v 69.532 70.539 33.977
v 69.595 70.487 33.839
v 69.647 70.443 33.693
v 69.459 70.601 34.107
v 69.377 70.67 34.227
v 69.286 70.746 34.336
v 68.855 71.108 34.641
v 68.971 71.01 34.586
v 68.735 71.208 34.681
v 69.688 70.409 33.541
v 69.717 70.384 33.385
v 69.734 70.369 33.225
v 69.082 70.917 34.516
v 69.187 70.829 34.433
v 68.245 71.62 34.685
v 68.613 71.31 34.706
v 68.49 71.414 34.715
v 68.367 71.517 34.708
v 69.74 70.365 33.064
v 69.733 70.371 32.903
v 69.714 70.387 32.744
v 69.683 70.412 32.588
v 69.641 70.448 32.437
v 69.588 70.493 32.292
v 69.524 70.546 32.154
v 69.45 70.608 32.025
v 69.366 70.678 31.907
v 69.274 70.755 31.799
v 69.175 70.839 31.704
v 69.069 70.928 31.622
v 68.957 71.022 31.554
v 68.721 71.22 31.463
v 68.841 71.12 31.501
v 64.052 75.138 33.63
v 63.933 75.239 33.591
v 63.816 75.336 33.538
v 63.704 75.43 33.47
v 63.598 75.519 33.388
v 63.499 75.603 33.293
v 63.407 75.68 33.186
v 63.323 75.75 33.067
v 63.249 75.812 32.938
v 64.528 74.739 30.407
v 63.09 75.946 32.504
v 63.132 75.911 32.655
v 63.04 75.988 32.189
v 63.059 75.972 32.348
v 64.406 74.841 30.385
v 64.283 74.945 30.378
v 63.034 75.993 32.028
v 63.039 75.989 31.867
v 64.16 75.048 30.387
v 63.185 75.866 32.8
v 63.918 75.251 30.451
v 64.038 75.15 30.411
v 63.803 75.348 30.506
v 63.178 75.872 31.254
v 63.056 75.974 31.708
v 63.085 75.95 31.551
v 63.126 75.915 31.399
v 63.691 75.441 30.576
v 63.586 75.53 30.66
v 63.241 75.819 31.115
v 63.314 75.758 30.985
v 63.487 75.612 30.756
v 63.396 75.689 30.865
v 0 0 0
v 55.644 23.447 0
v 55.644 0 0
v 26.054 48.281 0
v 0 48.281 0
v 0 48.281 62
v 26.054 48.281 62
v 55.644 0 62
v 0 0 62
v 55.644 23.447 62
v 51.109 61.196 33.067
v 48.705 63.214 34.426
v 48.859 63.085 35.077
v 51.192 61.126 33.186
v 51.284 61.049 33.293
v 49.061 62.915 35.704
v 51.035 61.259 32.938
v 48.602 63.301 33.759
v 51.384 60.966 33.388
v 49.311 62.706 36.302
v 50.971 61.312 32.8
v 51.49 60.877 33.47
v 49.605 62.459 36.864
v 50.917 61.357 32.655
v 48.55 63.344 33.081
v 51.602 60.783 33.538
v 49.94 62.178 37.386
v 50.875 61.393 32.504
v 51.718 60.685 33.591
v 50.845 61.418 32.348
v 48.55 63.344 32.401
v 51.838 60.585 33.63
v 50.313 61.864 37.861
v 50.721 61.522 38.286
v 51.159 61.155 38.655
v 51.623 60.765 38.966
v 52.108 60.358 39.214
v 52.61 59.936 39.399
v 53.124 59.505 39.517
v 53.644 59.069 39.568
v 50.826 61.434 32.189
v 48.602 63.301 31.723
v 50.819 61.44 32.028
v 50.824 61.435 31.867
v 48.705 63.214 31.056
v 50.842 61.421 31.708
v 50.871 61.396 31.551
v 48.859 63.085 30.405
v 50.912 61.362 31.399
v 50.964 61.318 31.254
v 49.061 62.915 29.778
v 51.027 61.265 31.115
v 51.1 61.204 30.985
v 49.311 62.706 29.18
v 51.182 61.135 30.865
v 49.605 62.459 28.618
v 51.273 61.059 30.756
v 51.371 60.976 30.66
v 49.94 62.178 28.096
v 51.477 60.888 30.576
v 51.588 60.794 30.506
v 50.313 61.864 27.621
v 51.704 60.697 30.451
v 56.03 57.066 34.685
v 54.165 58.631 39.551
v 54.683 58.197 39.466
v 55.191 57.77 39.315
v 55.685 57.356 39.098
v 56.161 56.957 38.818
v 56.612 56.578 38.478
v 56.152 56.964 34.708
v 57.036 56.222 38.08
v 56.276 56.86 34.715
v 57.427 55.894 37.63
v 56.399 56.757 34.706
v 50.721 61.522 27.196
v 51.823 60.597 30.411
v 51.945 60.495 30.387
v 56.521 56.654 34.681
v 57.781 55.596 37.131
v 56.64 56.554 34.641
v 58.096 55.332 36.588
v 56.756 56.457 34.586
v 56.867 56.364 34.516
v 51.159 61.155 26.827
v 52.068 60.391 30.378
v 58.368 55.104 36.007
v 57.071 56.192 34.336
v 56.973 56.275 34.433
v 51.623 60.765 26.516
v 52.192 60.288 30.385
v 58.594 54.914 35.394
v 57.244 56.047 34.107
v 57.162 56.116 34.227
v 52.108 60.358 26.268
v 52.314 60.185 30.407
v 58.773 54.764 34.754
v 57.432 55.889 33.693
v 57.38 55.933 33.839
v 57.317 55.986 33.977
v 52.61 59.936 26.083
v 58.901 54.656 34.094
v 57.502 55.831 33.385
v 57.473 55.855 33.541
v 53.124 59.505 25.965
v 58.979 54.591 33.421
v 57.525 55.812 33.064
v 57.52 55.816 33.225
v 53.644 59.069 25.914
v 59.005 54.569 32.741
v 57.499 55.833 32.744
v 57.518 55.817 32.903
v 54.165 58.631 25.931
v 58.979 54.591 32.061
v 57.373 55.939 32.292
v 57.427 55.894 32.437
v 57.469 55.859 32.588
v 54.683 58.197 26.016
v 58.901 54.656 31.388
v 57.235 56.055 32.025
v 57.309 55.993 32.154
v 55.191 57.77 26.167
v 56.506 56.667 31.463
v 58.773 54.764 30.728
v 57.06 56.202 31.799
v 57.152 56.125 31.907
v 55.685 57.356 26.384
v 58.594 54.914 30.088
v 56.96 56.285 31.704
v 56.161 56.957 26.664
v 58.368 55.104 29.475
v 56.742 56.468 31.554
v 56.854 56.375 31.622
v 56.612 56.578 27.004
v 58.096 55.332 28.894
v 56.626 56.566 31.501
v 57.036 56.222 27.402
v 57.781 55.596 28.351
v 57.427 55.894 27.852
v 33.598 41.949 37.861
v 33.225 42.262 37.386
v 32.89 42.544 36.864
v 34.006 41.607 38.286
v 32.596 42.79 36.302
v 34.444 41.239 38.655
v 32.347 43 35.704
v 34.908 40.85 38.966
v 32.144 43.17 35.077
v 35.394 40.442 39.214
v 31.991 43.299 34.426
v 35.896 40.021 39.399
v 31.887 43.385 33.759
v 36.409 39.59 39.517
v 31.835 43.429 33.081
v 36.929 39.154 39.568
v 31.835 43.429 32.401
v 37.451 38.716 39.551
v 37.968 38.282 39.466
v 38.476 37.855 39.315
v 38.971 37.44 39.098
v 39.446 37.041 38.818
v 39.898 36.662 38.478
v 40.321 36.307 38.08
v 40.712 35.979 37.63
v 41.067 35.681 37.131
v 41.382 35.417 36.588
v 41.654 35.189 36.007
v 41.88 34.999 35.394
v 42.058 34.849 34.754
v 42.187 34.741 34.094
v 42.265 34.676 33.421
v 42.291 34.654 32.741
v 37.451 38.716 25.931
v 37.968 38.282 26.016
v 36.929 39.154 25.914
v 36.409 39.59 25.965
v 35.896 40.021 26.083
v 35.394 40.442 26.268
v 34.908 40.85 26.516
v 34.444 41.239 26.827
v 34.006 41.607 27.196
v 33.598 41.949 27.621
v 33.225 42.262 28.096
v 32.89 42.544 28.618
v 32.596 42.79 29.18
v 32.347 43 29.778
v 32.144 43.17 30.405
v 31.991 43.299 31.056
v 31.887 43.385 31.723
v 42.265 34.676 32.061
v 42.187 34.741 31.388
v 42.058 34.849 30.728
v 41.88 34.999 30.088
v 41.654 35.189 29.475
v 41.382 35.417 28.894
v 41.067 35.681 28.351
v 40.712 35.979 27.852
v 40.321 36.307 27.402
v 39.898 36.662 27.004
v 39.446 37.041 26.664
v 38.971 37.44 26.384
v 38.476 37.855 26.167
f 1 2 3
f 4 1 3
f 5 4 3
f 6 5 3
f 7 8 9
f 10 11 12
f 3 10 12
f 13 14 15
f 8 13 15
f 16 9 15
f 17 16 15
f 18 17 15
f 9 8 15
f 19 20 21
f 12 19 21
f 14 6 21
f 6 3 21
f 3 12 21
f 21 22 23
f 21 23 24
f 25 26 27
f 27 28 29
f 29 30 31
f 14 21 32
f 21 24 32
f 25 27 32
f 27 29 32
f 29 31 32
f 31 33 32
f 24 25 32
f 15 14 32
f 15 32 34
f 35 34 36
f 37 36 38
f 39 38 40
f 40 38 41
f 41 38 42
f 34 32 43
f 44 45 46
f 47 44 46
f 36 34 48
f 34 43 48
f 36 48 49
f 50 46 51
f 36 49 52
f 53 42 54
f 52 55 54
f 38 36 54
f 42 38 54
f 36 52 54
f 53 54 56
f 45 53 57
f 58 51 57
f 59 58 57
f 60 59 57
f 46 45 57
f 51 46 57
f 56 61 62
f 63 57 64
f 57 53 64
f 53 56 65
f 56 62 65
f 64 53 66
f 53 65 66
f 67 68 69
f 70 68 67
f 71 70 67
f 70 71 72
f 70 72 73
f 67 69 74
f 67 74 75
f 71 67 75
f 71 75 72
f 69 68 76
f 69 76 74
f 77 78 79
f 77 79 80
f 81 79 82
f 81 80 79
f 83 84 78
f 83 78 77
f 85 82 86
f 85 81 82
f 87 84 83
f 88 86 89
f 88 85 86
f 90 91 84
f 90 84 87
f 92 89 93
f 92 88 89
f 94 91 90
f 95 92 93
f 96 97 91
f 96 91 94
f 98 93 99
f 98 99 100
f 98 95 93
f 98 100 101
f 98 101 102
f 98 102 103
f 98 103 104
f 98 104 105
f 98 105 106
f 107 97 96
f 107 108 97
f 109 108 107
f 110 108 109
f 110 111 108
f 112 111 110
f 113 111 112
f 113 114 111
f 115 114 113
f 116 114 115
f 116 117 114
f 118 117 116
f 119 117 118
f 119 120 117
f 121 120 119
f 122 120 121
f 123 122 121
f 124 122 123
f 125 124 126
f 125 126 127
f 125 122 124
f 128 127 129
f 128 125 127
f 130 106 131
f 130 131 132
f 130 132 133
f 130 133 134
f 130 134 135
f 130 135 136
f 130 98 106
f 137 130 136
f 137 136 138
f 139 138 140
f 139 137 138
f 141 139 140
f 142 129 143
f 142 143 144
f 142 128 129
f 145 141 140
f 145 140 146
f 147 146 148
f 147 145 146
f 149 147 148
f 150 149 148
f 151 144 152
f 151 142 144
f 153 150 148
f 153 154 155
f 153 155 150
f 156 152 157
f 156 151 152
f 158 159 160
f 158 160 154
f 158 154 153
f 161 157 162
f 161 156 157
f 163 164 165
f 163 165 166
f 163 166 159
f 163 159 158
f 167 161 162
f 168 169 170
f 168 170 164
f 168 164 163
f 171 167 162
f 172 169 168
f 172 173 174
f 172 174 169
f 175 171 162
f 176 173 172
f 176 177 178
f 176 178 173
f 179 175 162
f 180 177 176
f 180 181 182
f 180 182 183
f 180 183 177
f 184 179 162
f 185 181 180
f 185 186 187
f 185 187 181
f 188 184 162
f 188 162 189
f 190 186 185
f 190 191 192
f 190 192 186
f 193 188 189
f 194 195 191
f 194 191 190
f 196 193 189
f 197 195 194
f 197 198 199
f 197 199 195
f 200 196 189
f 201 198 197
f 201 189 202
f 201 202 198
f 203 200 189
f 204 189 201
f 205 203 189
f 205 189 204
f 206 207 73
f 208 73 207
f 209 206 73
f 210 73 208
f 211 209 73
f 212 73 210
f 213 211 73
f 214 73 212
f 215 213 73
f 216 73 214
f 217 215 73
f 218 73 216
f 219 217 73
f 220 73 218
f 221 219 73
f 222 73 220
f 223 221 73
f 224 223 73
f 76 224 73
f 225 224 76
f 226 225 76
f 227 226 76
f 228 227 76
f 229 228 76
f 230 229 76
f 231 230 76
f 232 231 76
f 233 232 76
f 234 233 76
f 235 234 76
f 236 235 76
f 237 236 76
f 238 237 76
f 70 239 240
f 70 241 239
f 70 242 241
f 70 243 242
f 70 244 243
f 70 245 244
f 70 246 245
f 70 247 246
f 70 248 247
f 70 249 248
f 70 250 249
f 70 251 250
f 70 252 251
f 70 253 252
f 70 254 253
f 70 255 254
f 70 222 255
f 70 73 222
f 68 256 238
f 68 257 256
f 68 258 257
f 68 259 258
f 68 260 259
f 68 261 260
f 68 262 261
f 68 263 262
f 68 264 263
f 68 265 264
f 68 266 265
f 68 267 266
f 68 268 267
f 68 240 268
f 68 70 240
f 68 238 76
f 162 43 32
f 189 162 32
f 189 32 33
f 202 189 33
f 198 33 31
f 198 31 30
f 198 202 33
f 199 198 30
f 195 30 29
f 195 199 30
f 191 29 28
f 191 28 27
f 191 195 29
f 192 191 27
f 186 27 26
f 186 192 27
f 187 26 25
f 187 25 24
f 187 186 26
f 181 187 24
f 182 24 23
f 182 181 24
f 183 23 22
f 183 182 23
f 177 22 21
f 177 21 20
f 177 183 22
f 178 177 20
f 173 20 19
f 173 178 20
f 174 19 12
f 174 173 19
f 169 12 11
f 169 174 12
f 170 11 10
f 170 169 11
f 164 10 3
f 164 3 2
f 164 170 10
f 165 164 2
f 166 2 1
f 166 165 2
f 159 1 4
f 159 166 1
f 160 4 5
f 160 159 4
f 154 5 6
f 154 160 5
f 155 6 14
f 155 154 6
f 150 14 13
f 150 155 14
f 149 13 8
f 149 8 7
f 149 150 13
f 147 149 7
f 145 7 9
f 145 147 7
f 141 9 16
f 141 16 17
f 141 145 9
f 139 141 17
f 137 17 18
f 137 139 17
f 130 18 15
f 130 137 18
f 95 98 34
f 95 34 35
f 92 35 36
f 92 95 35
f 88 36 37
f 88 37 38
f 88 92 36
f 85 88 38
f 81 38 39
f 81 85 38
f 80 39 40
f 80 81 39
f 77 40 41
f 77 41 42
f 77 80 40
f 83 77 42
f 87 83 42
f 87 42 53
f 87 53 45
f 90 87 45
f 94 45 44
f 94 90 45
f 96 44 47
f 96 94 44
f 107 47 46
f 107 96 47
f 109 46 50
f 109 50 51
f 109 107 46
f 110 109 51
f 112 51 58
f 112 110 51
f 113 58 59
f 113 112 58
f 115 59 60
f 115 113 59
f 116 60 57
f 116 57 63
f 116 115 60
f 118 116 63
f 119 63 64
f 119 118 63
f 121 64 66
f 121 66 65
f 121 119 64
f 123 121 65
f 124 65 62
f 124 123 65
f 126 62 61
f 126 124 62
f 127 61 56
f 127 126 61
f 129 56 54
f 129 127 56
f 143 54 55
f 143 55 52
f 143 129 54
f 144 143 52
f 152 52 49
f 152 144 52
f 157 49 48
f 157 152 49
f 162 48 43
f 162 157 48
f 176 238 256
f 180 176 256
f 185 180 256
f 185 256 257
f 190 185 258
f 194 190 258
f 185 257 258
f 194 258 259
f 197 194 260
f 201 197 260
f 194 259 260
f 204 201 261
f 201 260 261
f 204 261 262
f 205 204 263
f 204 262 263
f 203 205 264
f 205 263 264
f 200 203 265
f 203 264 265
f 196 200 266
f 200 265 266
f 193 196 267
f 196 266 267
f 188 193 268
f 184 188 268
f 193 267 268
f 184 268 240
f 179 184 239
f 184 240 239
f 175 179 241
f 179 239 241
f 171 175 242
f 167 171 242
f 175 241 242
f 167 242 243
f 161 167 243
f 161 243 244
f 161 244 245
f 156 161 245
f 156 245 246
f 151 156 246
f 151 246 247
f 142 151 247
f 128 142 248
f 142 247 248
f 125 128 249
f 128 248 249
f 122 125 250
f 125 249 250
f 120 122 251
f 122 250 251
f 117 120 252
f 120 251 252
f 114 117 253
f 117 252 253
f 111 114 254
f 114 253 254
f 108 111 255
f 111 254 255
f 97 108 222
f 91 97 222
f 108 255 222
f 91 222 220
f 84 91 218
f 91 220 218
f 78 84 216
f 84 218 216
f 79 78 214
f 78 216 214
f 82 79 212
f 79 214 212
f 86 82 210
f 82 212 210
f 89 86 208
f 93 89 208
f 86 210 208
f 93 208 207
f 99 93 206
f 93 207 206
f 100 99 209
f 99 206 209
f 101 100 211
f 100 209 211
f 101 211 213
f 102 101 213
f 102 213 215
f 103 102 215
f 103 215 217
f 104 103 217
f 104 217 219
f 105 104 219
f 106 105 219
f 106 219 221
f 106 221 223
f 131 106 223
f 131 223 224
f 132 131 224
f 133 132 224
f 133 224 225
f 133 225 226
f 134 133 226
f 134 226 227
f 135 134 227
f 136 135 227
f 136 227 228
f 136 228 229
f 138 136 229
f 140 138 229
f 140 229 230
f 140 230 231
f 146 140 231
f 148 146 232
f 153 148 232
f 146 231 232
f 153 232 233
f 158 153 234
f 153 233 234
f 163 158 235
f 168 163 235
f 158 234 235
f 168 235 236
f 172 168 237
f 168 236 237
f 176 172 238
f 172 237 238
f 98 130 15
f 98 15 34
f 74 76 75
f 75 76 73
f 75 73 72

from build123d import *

# Parameters (mm, degrees)
BOSS_EXTRUDE1_DEPTH = 62
SKETCH2_R           = 6.829046467
BOSS_EXTRUDE2_DEPTH = 26
BOSS_EXTRUDE3_DEPTH = 19


with BuildPart() as part:
    # Sketch1 → Boss-Extrude1 (new body)
    with BuildSketch(Plane.XY):
        Polygon((0, 0), (0, 48.281138127), (26.053837569, 48.281138127), (55.644011692, 23.446527703), (55.644011692, 0), align=None)
    extrude(amount=BOSS_EXTRUDE1_DEPTH)

    # Sketch2 → Boss-Extrude2 (add)
    with BuildSketch(Plane(origin=(34.542354114, 41.156847455, 0), x_dir=(0.765974254, -0.642871249, 0), z_dir=(0.642871249, 0.765974254, 0))):
        with Locations((3.286422452, -32.740977781)):
            Circle(SKETCH2_R)
    extrude(amount=BOSS_EXTRUDE2_DEPTH)

    # Sketch3 → Boss-Extrude3 (add)
    with BuildSketch(Plane(origin=(51.257006582, 61.072178055, 0), x_dir=(0.765974254, -0.642871249, 0), z_dir=(0.642871249, 0.765974254, 0))):
        with BuildLine():
            Line((6.231595343, -34.685018308), (0.758276941, -33.629675248))
            ThreePointArc((0.758276941, -33.629675248), (-0.542233107, -31.707846996), (1.379595145, -30.407336949))
            Line((1.379595145, -30.407336949), (6.852913547, -31.462680009))
            ThreePointArc((6.852913547, -31.462680009), (8.153423595, -33.38450826), (6.231595343, -34.685018308))
        make_face()
    extrude(amount=BOSS_EXTRUDE3_DEPTH)


solid = part.part
